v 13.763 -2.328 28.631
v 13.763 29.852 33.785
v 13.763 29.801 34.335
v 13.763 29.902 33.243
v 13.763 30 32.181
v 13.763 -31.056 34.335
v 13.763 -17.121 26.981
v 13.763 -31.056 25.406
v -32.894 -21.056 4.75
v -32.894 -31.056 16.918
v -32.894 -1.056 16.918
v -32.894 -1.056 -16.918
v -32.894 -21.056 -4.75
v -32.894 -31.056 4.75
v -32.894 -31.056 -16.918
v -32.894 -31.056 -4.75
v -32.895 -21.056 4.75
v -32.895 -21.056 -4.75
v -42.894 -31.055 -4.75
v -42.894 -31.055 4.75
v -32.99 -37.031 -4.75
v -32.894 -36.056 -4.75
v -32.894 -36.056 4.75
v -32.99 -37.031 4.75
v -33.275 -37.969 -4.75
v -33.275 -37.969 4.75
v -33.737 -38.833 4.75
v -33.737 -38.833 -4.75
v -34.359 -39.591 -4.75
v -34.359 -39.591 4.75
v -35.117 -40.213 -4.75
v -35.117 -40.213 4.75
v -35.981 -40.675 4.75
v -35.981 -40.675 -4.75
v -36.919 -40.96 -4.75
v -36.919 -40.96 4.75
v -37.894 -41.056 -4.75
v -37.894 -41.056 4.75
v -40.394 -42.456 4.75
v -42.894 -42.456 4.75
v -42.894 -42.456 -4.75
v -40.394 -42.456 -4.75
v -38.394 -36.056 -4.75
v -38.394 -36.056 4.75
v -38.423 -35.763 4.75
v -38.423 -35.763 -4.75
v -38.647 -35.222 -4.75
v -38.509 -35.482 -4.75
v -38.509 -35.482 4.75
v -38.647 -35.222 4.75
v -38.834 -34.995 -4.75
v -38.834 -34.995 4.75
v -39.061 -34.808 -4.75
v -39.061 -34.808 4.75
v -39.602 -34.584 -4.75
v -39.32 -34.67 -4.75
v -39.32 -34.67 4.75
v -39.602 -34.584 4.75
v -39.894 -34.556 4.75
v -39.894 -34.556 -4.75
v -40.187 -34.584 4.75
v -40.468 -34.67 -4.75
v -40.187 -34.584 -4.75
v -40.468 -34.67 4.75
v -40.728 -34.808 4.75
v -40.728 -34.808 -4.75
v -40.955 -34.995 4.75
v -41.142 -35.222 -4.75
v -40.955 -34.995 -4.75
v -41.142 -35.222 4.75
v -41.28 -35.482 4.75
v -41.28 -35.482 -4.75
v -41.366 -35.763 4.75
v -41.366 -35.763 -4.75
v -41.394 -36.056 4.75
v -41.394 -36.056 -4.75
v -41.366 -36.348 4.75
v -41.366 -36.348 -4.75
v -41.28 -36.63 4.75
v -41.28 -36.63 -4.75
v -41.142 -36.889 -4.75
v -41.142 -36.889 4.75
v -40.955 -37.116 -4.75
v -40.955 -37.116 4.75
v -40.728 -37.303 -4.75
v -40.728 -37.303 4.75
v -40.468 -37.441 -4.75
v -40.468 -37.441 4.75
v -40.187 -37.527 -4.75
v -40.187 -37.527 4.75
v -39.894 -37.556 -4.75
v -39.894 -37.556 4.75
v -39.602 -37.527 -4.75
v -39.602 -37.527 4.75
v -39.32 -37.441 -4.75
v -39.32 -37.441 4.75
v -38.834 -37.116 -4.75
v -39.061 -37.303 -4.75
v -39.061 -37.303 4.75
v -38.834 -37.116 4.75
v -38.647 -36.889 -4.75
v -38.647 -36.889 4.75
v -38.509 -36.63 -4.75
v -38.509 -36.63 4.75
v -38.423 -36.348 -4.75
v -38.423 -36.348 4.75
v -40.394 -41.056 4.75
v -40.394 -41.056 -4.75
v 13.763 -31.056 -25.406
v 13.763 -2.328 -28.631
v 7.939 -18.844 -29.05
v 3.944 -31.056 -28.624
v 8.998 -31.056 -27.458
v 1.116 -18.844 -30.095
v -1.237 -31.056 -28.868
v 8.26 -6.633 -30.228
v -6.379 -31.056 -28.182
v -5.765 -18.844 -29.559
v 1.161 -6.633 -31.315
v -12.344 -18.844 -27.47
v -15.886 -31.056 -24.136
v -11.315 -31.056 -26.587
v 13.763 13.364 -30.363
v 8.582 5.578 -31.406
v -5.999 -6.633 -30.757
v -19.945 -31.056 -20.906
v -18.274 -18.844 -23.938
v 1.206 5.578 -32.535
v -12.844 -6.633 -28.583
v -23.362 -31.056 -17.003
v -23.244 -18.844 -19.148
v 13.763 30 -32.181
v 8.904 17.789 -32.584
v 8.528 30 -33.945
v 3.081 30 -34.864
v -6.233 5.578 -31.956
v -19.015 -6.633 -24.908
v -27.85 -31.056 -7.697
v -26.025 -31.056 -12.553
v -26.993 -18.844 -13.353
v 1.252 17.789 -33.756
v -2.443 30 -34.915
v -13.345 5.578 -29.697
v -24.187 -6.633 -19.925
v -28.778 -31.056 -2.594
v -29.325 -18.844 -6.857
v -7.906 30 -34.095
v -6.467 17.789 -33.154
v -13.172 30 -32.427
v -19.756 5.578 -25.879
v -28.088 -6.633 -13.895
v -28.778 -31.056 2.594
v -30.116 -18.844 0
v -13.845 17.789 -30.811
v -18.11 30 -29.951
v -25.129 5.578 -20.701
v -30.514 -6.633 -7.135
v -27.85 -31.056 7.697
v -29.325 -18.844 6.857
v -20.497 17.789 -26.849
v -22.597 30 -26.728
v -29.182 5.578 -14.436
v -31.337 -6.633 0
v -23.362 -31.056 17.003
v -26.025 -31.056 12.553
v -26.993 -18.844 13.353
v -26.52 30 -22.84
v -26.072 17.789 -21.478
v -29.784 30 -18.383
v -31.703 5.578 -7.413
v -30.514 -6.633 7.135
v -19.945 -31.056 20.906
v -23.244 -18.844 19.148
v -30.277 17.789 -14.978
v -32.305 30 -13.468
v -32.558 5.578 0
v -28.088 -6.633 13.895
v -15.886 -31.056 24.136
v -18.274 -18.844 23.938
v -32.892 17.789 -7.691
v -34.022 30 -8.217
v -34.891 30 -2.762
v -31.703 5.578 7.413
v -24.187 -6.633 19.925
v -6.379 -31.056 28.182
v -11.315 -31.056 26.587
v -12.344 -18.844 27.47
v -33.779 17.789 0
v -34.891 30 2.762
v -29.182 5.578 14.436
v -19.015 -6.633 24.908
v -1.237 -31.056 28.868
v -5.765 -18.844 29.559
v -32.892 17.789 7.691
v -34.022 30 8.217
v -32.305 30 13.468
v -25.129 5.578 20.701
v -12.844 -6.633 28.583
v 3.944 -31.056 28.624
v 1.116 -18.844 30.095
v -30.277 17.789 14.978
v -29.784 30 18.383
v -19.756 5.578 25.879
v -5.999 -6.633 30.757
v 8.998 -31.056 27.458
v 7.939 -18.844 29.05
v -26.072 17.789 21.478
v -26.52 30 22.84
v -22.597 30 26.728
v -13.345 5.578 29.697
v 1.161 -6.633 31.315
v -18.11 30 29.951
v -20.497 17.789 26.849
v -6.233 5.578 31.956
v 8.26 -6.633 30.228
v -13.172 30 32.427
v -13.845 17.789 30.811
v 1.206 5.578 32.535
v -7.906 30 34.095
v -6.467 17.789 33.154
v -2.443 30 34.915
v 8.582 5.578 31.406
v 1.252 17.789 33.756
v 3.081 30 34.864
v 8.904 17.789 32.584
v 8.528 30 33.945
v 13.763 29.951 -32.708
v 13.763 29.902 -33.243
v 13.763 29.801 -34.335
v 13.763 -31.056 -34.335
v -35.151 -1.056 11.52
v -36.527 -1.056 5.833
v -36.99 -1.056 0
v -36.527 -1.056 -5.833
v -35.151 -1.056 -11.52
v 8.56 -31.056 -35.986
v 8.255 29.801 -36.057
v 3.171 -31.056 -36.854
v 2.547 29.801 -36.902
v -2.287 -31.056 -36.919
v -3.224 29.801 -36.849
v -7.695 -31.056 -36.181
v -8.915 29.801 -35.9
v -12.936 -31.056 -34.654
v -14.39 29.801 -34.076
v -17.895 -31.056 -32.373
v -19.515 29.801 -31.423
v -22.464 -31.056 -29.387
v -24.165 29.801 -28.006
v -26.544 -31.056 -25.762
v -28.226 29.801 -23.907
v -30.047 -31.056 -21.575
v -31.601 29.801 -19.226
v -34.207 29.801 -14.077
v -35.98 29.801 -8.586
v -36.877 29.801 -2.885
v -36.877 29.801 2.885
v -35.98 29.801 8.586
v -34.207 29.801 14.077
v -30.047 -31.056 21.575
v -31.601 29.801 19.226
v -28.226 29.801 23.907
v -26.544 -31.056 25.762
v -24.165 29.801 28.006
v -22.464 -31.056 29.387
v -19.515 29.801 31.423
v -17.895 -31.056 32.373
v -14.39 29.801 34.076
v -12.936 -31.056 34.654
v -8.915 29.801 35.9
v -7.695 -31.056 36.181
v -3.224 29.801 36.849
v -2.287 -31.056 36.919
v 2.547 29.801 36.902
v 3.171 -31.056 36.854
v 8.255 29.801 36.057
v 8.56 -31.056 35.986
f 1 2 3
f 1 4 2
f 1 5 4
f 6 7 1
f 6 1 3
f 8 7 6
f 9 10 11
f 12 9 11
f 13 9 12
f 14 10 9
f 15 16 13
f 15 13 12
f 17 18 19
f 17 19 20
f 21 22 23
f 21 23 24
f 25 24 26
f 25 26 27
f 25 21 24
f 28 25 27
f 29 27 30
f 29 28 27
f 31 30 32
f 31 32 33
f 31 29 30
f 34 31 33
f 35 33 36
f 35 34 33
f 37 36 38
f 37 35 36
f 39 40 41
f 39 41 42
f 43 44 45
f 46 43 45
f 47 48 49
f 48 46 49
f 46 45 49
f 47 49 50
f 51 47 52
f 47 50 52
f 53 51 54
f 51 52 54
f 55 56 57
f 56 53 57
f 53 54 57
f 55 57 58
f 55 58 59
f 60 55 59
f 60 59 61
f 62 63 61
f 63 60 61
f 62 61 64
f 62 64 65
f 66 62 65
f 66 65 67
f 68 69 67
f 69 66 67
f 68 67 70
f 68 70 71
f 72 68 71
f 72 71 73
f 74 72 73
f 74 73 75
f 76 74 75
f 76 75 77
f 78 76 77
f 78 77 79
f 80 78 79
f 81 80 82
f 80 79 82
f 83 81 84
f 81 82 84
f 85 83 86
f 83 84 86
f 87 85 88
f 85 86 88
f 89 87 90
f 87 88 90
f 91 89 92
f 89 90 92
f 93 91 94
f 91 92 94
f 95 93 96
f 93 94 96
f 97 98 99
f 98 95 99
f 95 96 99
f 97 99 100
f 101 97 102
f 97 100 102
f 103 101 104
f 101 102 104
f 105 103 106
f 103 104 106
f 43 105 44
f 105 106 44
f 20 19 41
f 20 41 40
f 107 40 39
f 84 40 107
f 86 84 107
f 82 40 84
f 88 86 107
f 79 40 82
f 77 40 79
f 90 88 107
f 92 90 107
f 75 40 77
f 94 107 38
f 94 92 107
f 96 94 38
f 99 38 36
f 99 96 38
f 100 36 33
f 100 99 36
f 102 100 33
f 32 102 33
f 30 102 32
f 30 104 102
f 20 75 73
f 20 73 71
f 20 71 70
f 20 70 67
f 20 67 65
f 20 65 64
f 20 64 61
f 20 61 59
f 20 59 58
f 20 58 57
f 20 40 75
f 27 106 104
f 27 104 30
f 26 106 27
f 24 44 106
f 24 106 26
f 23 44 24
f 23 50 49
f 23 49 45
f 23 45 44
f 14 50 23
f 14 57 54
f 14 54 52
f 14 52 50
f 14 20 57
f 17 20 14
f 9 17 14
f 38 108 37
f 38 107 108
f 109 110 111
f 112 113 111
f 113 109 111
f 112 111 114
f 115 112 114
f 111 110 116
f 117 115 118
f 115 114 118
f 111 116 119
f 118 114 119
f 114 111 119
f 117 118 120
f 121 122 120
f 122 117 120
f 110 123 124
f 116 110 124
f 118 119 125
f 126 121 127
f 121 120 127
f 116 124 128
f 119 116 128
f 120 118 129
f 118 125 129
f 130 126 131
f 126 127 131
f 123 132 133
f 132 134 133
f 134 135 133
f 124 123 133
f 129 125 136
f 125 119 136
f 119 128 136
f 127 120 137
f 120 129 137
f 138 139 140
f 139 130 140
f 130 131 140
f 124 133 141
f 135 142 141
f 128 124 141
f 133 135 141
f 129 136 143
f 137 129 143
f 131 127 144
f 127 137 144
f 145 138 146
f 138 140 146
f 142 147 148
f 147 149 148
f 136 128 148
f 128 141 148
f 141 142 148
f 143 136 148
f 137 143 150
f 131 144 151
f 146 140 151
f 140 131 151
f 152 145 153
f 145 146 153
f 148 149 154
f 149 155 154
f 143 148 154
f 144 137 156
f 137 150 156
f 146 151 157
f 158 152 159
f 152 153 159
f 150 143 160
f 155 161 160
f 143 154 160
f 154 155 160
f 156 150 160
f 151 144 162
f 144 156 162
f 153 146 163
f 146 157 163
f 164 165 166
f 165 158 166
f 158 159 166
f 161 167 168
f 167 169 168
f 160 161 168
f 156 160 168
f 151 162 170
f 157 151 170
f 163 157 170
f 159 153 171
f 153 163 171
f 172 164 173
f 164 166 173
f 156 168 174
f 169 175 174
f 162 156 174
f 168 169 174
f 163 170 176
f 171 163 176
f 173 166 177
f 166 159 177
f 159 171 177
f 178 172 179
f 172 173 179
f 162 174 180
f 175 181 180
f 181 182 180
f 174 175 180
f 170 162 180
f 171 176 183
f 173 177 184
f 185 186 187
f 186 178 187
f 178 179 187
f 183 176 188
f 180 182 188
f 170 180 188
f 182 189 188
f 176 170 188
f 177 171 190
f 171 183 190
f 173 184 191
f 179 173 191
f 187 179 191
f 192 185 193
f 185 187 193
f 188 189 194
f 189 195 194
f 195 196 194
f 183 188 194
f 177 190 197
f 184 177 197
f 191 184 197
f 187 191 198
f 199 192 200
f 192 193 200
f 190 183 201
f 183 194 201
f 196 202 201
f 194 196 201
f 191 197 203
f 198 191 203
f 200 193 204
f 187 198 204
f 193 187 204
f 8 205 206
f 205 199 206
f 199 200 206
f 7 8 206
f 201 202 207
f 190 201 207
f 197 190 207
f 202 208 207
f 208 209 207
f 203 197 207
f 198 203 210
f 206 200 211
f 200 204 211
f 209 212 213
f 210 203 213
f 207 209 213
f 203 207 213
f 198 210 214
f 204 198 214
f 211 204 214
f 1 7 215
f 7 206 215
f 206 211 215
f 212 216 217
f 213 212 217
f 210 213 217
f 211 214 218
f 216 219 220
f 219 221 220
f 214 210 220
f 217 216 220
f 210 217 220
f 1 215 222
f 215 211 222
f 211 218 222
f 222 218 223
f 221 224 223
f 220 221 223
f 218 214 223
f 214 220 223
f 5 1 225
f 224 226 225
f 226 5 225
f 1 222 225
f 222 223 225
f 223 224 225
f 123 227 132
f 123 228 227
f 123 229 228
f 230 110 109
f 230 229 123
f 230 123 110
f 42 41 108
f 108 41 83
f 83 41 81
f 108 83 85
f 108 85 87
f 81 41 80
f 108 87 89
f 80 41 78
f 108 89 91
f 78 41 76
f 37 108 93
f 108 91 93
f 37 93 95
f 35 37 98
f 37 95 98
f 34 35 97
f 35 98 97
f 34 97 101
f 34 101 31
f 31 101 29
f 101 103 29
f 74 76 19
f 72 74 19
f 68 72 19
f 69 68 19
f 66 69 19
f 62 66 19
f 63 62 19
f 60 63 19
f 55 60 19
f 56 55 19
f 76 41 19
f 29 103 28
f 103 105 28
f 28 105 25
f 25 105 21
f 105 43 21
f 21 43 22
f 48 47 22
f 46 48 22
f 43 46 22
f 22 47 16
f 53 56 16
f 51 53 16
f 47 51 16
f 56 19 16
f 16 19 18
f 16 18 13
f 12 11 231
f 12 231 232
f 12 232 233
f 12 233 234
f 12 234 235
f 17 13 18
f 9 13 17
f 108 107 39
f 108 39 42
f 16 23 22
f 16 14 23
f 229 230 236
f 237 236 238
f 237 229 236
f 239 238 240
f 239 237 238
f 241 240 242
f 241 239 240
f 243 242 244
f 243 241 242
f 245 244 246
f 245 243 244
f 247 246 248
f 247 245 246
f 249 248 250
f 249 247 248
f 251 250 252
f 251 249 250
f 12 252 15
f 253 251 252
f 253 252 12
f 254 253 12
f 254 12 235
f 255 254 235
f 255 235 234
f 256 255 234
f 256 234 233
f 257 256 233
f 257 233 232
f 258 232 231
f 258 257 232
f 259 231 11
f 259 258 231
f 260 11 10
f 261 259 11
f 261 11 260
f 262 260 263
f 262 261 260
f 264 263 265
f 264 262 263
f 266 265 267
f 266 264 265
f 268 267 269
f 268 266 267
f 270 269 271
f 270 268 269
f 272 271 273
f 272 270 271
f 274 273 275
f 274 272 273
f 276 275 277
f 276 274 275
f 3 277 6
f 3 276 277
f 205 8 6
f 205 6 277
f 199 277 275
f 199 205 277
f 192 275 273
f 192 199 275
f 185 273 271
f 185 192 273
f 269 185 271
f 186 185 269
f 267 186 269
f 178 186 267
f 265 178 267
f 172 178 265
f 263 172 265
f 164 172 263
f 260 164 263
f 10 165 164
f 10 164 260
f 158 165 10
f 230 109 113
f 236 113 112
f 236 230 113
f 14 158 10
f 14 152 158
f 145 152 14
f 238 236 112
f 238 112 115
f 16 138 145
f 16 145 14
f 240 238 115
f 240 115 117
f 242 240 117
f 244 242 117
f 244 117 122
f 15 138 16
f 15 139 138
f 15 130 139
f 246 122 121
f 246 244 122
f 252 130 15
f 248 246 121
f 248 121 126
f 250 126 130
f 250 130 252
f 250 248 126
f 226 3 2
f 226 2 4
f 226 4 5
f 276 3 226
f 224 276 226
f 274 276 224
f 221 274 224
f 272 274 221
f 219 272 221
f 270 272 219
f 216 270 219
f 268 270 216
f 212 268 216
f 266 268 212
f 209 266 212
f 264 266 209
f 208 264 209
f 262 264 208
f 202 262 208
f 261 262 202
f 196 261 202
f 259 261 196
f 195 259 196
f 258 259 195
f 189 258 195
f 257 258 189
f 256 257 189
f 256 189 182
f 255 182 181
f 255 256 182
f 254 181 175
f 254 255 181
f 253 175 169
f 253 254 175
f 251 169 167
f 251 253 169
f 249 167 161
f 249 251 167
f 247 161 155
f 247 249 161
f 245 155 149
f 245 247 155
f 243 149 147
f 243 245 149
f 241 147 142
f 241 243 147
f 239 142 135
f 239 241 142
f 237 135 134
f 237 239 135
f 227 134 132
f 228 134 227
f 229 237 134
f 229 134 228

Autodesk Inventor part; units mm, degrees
sketch "スケッチ1" plane through (0, 0, 0) normal (0, 0, 1) x (1, 0, 0)
  line L0 (0, 0) -> (32, 0)
  line L1 (0, 0) -> (0, 30)
  line L2 (0, 30) -> (35, 30)
  line L3 (35, 30) -> (32, 0)
  line L4 (32, 0) -> (33.9901, -0.199)
  line L5 (33.9901, -0.199) -> (36.9901, 29.801)
  line L6 (36.9901, 29.801) -> (35, 30)
  line L7 (0, 0) -> (0, -80)
  line L8 (0, -80) -> (26.01, -80)
  line L9 (32, 0) -> (24.0199, -79.801)
  line L10 (33.9901, -0.199) -> (26.01, -80)
  line L11 (26.01, -80) -> (24.0199, -79.801)
  line L12 (26.01, -80) -> (36.9901, -80)
  line L13 (36.9901, -80) -> (36.9901, 29.801)
  line L14 (24.0199, -79.801) -> (24, -80)
  dimension "d0" = 32
  dimension "d1" = 30
  dimension "d2" = 35
  dimension "d3" = 2
  dimension "d4" = 80
revolve "回転1" add sketch "スケッチ1" angle 360 about axis through (0, 0, 0) along (0, 1, 0) contours L3 L6 L5 L4 | L4 L10 L11 L9 | L5 L13 L12 L10 | L11 L8 L14
ref_plane "作業平面4" through (0, 0, 37) normal (0, 0, 1) x (1, 0, 0)
sketch "スケッチ2" plane through (0, 0, 37) normal (0, 0, 1) x (1, 0, 0)
  circle A0 centre (0, 0) radius 33
  line L0 (0, 0) -> (0, -46)
  line L1 (-13.5, -41) -> (13.5, -41)
  line L2 (13.5, -41) -> (13.5, -51)
  line L3 (13.5, -51) -> (-13.5, -51)
  line L4 (-13.5, -51) -> (-13.5, -41)
  line L5 (-13.5, -41) -> (13.5, -51) construction
  line L6 (13.5, -41) -> (-13.5, -51) construction
  dimension "d10" = 66
  dimension "d11" = 46
  dimension "d12" = 27
  dimension "d13" = 10
sketch "スケッチ4" plane through (0, -80, 0) normal (0, -1, 0) x (1, 0, 0)
  circle A0 centre (0, 0) radius 36.9901 projected
  line L0 (-20, 25.4) -> (20, 25.4)
  line L1 (20, 25.4) -> (20, -25.4)
  line L2 (20, -25.4) -> (-20, -25.4)
  line L3 (-20, -25.4) -> (-20, 25.4)
  line L4 (-20, 25.4) -> (20, -25.4) construction
  line L5 (20, 25.4) -> (-20, -25.4) construction
  arc A1 (20, 13.2808) -> (-20, 13.2808) centre (0, 0) ccw
  arc A2 (-20, -13.2808) -> (20, -13.0826) centre (-0.0647, -0.1207) ccw
  dimension "d14" = 40
  dimension "d15" = 50.8
extrude "押し出し1" add sketch "スケッチ4" along normal blind 10 contours L0 L1 A1 L3 | A2 L1 L2 L3
sketch "スケッチ5" plane through (-20, -80, 25.4) normal (0, 0, 1) x (1, 0, 0)
  line L0 (0, 0) -> (40, 0) projected
  line L1 (40, 0) -> (40, -10) projected
  line L2 (20, 0) -> (20, -5)
  line L3 (20, -5) -> (35, -5)
  line L4 (20, -5) -> (5, -5)
  circle A0 centre (5, -5) radius 1.25
  circle A1 centre (35, -5) radius 1.25
  point P0 (20, 80)
  dimension "d18" = 5
  dimension "d19" = 15
  dimension "d20" = 15
  dimension "d21" = 2.5
  dimension "d22" = 2.5
extrude "押し出し2" cut sketch "スケッチ5" against normal blind 51
extrude "押し出し3" cut sketch "スケッチ2" against normal blind 80 contours L1 L2 L3 L4
sketch "スケッチ6" plane through (0, -80, 0) normal (0, -1, 0) x (1, 0, 0)
  arc A0 (-20, -13.2808) -> (2.6513, -23.8531) centre (-0.0647, -0.1207) ccw projected
  arc A1 (20, -13.2665) -> (2.6513, -23.8531) centre (0, 0) ccw projected
  line L0 (20, -13.2665) -> (20, -25.4) projected
  line L1 (-20, -25.4) -> (-20, -13.2808) projected
  line L2 (20, 25.4) -> (20, 13.2808) projected
  arc A2 (20, 13.2808) -> (-20, 13.2808) centre (0, 0) ccw projected
  line L3 (-20, 13.2808) -> (-20, 25.4) projected
  arc A3 (-20, 13.2808) -> (-20, -13.2808) centre (0.1181, 0) ccw
  arc A4 (-20, 25.4) -> (-20, -25.4) centre (1.0675, 0) ccw
  arc A5 (20, -13.2665) -> (20, 13.2808) centre (0.0108, 0.0072) ccw
  arc A6 (20, -25.4) -> (20, 25.4) centre (-1.0675, 0) ccw
  dimension "d27" = 33
  dimension "d28" = 33
extrude "押し出し4" add sketch "スケッチ6" along normal blind 10 contours L1 A4 L3 A3 A1 | A5 L2 A6 L0
sketch "スケッチ7" plane through (0, -51, 0) normal (0, 1, 0) x (1, 0, 0)
  arc A0 (13.5, 34.4386) -> (-13.5, 34.4386) centre (0, 0) ccw projected
  line L0 (-10, 26.9901) -> (10, 26.9901)
  line L1 (10, 26.9901) -> (10, 46.9901)
  line L2 (10, 46.9901) -> (-10, 46.9901)
  line L3 (-10, 46.9901) -> (-10, 26.9901)
  line L4 (-10, 26.9901) -> (10, 46.9901) construction
  line L5 (10, 26.9901) -> (-10, 46.9901) construction
  point P0 (0, 36.9901)
  dimension "d31" = 20
extrude "押し出し5" add sketch "スケッチ7" against normal blind 5
mirror "ミラー1" about plane through (0, 0, 0) normal (0, 0, 1) of "押し出し5"
ref_plane "作業平面5" through (10, -51, 41.3014) normal (0, 1, 0) x (1, 0, 0)
sketch "スケッチ8" plane through (10, -51, 41.3014) normal (0, 1, 0) x (1, 0, 0)
  line L0 (-14.9767, 1.255) -> (-4.9767, 1.255)
  line L1 (-4.9767, 1.255) -> (-4.9767, 81.255)
  line L2 (-4.9767, 81.255) -> (-14.9767, 81.255)
  line L3 (-14.9767, 81.255) -> (-14.9767, 1.255)
  line L4 (-14.9767, 1.255) -> (-4.9767, 81.255) construction
  line L5 (-4.9767, 1.255) -> (-14.9767, 81.255) construction
  line L6 (-9.9767, 81.255) -> (-9.9767, 1.255)
  circle A0 centre (-9.9767, 81.255) radius 1
  circle A1 centre (-9.9767, 1.255) radius 1
  point P0 (-9.9767, 41.255)
  dimension "d42" = 10
  dimension "d43" = 80
  dimension "d44" = 2
  dimension "d45" = 2
extrude "押し出し7" cut sketch "スケッチ8" against normal blind 5 contours L6 A1 L0 | L0 A1 | L0 A1 L6 | A0 L2 L6 | L6 L2 A0 | L2 A0
ref_plane "作業平面6" through (-10, -53.5, -46.9901) normal (0, 0, -1) x (-1, 0, 0)
sketch "スケッチ9" plane through (-10, -53.5, -46.9901) normal (0, 0, -1) x (-1, 0, 0)
  line L0 (26.829, -26.5556) -> (-47.1085, -26.5556)
  line L1 (-0.028, -26.5556) -> (-0.028, 22.4444)
  line L2 (-23.7626, 22.4444) -> (28.9336, 22.4444)
  line L3 (28.9336, 22.4444) -> (28.9336, 86.0653)
  line L4 (28.9336, 86.0653) -> (-23.7626, 86.0653)
  line L5 (-23.7626, 86.0653) -> (-23.7626, 22.4444)
  line L6 (-23.7626, 86.0653) -> (-48.5643, 86.0653)
  line L7 (-48.5643, 86.0653) -> (-48.5643, -39.6917)
  line L8 (-48.5643, -39.6917) -> (-23.7626, -39.6917)
  line L9 (-23.7626, -39.6917) -> (-23.7626, 86.0653)
  line L10 (-23.7626, 22.4444) -> (28.9336, 22.4444)
  line L11 (28.9336, 22.4444) -> (28.9336, -39.6917)
  line L12 (28.9336, -39.6917) -> (-23.7626, -39.6917)
  line L13 (-23.7626, -39.6917) -> (-23.7626, 22.4444)
  point P0 (-10, 53.5)
  dimension "d48" = 49
extrude "押し出し9" cut sketch "スケッチ9" against normal blind 95 contours L1 L2 L11 L12 L9 L0 | L0 L9 L2 L1 | L9 L8 L7 L6 L5
sketch "スケッチ10" plane through (0, -31.0556, 0) normal (0, -1, 0) x (1, 0, 0)
  arc A0 (13.7626, 34.3345) -> (13.7626, -34.3345) centre (0, 0) ccw projected
  arc A1 (13.7626, 25.4063) -> (13.7626, -25.4063) centre (0, 0) ccw projected
  line L0 (13.7626, 25.4063) -> (13.7626, 34.3345) projected
  line L1 (-28.8944, 0) -> (-32.8944, 0)
  line L2 (-32.8944, 0) -> (-32.8944, 16.9181)
  line L3 (-32.8944, 0) -> (-32.8944, -16.9181)
  dimension "d53" = 4
extrude "押し出し10" cut sketch "スケッチ10" against normal blind 30 contours L2 L3 A0
sketch "スケッチ11" plane through (-32.8944, -31.0556, -16.9181) normal (-1, 0, 0) x (0, 0, 1)
  line L0 (33.8361, 0) -> (0, 0) projected
  line L1 (0, 0) -> (0, 30) projected
  line L2 (16.9181, 0) -> (16.9181, 5)
  line L3 (12.1681, 10) -> (21.6681, 10)
  line L4 (21.6681, 10) -> (21.6681, 0)
  line L5 (21.6681, 0) -> (12.1681, 0)
  line L6 (12.1681, 0) -> (12.1681, 10)
  line L7 (12.1681, 10) -> (21.6681, 0) construction
  line L8 (21.6681, 10) -> (12.1681, 0) construction
  point P0 (16.9181, 31.0556)
  dimension "d56" = 5
  dimension "d57" = 9.5
extrude "押し出し11" add sketch "スケッチ11" along normal blind 10
sketch "スケッチ12" plane through (0, -31.0556, 0) normal (0, -1, 0) x (1, 0, 0)
  line L0 (-42.8944, 4.75) -> (-32.8944, 4.75)
  line L1 (-32.8944, 4.75) -> (-32.8944, -4.75)
  line L2 (-32.8944, -4.75) -> (-42.8944, -4.75)
  line L3 (-42.8944, -4.75) -> (-42.8944, 4.75)
  line L4 (-42.8944, 4.75) -> (-32.8944, -4.75) construction
  line L5 (-32.8944, 4.75) -> (-42.8944, -4.75) construction
  point P0 (-37.8944, 0)
extrude "押し出し12" add sketch "スケッチ12" along normal blind 10
sketch "スケッチ13" plane through (-42.8944, -21.0556, 4.75) normal (0, 0, 1) x (1, 0, 0)
  line L0 (0, 0) -> (0, -20) projected
  line L1 (0, -20) -> (0, -15)
  line L2 (0, -15) -> (3, -15)
  circle A0 centre (3, -15) radius 1.5
  point P0 (42.8944, 21.0556)
  dimension "d62" = 3
  dimension "d63" = 3
extrude "押し出し13" cut sketch "スケッチ13" against normal blind 10
chamfer "面取り1" distance 10 angle 45 1 edges at (-42.8944, -21.0556, 0)
fillet "フィレット2" radius 5 1 edges at (-32.8944, -41.0556, 0)
sketch "スケッチ14" plane through (0, -41.0556, 0) normal (0, -1, 0) x (1, 0, 0)
  line L0 (-42.8944, -4.75) -> (-37.8944, -4.75) projected
  line L1 (-42.8944, 4.75) -> (-40.3944, 4.75)
  line L2 (-40.3944, 4.75) -> (-40.3944, -4.75)
  line L3 (-40.3944, -4.75) -> (-42.8944, -4.75)
  line L4 (-42.8944, -4.75) -> (-42.8944, 4.75)
  point P0 (0, 0)
extrude "押し出し14" add sketch "スケッチ14" along normal blind 1.4
properties part number "知能ロボコン吸引部２.1.2"
